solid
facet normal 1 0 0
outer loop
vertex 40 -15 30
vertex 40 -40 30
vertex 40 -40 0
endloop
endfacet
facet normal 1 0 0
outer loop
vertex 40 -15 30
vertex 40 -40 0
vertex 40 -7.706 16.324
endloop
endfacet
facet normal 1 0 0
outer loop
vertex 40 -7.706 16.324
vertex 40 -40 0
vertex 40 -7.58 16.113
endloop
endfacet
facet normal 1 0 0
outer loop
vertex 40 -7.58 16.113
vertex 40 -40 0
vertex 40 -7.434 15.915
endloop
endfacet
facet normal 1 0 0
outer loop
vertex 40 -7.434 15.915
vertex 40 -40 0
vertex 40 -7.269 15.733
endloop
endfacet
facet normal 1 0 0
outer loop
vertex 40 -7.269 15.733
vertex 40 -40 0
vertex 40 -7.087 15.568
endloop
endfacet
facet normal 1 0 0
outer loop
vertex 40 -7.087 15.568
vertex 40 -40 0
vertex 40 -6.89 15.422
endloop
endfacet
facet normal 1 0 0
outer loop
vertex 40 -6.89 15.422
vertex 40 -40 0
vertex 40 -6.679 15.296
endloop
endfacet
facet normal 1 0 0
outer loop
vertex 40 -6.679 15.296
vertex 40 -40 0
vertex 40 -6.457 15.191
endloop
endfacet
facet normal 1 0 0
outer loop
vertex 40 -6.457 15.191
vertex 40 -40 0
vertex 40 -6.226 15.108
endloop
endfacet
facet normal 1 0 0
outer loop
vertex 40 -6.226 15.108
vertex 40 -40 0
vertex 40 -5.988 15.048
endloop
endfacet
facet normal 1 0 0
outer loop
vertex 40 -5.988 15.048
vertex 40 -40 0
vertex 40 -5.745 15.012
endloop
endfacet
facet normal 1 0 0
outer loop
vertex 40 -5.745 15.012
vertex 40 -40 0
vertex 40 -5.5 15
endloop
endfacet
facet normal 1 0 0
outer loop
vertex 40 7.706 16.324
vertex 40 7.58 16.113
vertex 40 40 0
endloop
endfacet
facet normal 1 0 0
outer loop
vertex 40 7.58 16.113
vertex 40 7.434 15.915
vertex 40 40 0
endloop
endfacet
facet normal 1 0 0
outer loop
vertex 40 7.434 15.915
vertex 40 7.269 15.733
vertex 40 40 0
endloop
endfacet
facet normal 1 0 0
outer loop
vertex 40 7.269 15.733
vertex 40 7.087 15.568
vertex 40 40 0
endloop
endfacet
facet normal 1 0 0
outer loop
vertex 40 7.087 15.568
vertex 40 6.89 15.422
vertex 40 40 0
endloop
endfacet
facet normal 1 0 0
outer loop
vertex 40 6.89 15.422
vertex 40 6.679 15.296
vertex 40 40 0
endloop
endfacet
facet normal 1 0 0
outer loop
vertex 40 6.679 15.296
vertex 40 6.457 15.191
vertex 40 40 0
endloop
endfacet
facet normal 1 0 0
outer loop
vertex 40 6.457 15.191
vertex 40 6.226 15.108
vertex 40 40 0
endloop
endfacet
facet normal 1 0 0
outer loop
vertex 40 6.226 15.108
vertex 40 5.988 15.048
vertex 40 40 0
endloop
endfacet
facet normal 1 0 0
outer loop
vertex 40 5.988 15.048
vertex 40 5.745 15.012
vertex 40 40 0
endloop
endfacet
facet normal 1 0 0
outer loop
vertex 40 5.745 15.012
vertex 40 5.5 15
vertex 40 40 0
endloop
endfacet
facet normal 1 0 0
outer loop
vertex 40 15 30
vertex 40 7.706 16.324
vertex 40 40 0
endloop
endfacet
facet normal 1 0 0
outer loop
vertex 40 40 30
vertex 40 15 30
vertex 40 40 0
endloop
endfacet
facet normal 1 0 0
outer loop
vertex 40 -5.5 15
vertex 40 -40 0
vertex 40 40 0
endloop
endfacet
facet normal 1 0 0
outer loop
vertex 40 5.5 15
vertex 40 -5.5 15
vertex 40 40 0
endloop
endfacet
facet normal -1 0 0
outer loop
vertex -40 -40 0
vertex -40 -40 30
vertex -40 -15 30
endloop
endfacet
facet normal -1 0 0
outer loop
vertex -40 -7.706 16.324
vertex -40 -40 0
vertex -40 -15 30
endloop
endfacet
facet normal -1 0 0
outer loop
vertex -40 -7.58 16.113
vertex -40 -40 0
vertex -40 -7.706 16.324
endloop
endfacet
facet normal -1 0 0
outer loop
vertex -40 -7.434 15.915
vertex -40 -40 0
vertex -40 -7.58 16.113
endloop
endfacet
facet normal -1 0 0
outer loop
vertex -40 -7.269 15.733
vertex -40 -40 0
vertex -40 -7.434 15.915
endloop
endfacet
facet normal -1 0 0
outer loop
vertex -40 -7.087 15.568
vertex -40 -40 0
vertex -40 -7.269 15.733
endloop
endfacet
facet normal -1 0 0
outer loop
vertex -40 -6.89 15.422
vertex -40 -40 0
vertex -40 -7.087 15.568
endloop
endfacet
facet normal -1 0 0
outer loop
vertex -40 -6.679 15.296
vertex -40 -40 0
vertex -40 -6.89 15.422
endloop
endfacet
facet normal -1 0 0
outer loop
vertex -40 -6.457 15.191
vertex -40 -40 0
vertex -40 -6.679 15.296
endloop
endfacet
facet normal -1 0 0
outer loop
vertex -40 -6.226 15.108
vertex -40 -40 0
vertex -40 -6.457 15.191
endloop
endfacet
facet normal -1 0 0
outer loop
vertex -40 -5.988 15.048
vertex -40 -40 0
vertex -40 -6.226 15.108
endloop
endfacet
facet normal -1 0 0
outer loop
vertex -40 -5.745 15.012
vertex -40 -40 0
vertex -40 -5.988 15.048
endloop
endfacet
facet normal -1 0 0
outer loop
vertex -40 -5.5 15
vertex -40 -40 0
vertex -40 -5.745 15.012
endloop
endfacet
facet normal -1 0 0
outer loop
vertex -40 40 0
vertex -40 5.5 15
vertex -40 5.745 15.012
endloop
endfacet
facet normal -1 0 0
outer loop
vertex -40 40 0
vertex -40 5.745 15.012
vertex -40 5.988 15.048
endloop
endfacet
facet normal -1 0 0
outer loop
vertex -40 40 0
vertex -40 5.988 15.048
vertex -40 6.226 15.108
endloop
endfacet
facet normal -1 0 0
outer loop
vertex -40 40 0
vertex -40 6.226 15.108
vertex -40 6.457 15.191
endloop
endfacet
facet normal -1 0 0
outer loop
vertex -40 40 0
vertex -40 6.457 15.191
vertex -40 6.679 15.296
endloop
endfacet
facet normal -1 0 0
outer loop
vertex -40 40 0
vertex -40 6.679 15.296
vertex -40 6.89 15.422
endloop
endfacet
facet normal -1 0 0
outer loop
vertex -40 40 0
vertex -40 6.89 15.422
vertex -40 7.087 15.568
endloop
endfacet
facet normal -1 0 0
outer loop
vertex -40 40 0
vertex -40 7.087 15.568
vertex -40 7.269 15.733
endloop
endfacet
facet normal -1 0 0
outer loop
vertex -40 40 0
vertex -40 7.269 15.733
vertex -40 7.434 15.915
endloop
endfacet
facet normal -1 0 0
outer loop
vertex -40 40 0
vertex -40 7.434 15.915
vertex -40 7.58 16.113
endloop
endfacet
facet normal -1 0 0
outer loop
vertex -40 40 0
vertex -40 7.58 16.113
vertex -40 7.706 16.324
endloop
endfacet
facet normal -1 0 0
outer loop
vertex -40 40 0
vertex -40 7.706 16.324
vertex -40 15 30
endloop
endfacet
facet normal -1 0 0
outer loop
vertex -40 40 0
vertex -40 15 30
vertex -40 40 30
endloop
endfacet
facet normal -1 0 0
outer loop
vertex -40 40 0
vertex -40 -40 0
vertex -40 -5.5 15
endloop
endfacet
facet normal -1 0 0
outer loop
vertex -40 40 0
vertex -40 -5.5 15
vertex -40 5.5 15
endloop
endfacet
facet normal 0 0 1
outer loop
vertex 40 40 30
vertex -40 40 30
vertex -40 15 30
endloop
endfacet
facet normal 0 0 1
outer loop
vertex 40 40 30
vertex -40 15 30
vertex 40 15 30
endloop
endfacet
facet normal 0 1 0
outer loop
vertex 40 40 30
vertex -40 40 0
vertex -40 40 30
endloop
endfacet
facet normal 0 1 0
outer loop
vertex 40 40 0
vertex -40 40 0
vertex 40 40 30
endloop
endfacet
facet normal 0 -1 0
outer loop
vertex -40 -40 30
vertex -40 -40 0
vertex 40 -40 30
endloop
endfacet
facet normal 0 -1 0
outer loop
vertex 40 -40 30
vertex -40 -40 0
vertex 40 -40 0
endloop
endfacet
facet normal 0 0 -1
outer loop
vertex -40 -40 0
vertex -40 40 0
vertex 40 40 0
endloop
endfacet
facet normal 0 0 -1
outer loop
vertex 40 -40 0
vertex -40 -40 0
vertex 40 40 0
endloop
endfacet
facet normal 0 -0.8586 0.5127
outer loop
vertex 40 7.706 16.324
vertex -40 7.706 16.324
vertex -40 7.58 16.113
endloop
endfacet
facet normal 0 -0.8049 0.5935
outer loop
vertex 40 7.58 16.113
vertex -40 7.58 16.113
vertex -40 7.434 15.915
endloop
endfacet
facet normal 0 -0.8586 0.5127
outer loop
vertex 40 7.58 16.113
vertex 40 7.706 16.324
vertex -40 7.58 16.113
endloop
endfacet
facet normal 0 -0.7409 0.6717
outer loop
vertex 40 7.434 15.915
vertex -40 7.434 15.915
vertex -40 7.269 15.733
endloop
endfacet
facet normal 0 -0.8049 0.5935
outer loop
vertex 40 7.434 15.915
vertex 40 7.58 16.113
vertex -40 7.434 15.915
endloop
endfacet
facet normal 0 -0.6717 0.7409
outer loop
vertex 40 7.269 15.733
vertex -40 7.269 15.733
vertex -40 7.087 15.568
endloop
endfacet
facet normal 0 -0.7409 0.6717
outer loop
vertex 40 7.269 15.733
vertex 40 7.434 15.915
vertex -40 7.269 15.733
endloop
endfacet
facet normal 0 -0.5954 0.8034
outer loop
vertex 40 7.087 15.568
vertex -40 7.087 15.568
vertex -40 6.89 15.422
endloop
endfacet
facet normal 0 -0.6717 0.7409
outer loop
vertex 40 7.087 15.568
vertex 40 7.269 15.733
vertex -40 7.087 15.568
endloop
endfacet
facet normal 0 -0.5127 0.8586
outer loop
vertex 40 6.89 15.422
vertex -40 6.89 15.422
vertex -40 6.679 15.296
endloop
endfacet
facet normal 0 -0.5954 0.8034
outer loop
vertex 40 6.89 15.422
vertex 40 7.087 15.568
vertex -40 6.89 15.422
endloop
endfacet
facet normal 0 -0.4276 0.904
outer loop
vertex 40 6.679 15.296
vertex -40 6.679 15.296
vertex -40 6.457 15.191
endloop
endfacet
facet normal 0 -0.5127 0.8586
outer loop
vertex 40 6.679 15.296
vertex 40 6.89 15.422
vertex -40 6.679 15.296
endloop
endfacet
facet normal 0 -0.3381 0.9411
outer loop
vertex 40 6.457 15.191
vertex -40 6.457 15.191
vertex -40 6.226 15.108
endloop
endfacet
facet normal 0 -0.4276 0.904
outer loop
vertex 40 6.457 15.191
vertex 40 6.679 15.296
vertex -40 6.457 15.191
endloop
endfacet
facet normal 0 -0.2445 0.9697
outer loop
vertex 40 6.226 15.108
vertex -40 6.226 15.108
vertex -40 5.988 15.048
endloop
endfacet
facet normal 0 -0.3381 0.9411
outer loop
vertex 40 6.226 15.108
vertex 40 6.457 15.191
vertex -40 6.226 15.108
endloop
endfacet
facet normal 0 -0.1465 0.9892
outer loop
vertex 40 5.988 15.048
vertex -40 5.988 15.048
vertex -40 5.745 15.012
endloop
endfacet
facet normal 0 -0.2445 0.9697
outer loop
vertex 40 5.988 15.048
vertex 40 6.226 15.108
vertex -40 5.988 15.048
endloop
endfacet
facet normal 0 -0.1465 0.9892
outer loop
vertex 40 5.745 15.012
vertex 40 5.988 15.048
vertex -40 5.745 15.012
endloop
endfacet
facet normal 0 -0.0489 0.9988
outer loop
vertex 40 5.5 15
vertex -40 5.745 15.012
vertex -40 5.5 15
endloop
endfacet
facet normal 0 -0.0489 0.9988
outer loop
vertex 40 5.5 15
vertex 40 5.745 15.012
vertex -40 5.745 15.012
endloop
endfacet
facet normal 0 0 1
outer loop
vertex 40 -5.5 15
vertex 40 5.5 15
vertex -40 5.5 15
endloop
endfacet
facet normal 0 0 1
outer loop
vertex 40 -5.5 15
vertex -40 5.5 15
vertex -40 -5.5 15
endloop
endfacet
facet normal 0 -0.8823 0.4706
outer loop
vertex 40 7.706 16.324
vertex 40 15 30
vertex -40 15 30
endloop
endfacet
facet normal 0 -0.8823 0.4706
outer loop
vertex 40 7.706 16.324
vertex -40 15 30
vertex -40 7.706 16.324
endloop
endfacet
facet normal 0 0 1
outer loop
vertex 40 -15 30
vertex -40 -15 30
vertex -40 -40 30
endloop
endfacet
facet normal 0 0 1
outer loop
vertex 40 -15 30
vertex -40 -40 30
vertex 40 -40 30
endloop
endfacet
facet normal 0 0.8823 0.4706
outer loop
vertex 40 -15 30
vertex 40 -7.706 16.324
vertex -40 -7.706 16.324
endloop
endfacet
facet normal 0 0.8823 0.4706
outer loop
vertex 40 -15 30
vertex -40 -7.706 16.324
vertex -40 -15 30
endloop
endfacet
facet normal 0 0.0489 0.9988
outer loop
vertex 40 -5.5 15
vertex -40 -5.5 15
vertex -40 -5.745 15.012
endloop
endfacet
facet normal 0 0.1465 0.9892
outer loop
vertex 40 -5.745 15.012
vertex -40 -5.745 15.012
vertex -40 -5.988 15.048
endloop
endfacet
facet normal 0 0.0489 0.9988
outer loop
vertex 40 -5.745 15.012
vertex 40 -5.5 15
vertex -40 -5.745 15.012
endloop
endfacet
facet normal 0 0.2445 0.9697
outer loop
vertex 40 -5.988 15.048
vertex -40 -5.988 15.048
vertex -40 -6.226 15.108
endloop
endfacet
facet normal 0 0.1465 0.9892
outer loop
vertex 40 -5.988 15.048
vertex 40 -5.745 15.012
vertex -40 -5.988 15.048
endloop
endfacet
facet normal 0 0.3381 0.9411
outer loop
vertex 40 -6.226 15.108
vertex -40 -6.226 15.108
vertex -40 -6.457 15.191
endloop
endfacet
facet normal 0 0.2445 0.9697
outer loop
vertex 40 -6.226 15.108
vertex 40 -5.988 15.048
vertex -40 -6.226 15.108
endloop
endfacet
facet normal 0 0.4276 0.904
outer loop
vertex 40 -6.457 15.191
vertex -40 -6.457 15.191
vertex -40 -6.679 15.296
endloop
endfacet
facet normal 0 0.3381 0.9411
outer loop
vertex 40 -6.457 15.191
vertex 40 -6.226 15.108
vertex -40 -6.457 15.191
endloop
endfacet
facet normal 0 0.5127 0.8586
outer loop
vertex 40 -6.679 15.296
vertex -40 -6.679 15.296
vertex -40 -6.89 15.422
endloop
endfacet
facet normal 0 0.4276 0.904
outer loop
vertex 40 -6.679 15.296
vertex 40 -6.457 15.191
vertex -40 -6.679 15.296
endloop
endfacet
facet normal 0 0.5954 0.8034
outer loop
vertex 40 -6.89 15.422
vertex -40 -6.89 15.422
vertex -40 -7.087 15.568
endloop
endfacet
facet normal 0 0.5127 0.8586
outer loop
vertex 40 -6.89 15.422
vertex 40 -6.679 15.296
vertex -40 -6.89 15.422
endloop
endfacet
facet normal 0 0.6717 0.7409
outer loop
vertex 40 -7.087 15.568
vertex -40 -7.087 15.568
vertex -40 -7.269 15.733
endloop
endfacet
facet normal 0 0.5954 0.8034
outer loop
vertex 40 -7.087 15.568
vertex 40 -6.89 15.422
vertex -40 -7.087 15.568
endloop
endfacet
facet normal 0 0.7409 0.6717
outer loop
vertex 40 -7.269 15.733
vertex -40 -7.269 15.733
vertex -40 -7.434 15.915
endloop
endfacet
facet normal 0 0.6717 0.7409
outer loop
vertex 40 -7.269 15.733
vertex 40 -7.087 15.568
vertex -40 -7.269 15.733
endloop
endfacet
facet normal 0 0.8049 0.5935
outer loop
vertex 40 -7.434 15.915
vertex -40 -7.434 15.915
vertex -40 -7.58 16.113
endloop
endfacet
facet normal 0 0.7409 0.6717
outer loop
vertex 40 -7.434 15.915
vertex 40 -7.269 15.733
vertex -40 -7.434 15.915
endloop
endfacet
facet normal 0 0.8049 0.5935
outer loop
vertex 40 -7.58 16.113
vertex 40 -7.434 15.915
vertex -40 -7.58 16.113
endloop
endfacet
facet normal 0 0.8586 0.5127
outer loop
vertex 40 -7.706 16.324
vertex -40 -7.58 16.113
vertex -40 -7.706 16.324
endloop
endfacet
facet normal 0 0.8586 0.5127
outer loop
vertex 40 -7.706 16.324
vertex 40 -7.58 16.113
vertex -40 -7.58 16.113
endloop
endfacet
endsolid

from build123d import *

# Parameters (mm, degrees)
CROQUIS1_W              = 80
CROQUIS1_H              = 80
SALIENTE_EXTRUIR1_DEPTH = 30
CORTAR_EXTRUIR1_DEPTH   = 95.339811321


with BuildPart() as part:
    # Croquis1 → Saliente-Extruir1 (new body)
    with BuildSketch(Plane.XY):
        Rectangle(CROQUIS1_W, CROQUIS1_H)
    extrude(amount=SALIENTE_EXTRUIR1_DEPTH)

    # Croquis2 → Cortar-Extruir1 (cut, through all)
    with BuildSketch(Plane(origin=(40, 0, 0), x_dir=(0, 0, -1), z_dir=(1, 0, 0))):
        with BuildLine():
            Line((-30, 15), (-16.323529412, 7.705882353))
            ThreePointArc((-16.323529412, 7.705882353), (-15.356267686, 6.786239389), (-15, 5.5))
            Line((-15, 5.5), (-15, -5.5))
            ThreePointArc((-15, -5.5), (-15.356267686, -6.786239389), (-16.323529412, -7.705882353))
            Line((-16.323529412, -7.705882353), (-30, -15))
            Line((-30, -15), (-30, 15))
        make_face()
    extrude(amount=-CORTAR_EXTRUIR1_DEPTH, mode=Mode.SUBTRACT)


solid = part.part
